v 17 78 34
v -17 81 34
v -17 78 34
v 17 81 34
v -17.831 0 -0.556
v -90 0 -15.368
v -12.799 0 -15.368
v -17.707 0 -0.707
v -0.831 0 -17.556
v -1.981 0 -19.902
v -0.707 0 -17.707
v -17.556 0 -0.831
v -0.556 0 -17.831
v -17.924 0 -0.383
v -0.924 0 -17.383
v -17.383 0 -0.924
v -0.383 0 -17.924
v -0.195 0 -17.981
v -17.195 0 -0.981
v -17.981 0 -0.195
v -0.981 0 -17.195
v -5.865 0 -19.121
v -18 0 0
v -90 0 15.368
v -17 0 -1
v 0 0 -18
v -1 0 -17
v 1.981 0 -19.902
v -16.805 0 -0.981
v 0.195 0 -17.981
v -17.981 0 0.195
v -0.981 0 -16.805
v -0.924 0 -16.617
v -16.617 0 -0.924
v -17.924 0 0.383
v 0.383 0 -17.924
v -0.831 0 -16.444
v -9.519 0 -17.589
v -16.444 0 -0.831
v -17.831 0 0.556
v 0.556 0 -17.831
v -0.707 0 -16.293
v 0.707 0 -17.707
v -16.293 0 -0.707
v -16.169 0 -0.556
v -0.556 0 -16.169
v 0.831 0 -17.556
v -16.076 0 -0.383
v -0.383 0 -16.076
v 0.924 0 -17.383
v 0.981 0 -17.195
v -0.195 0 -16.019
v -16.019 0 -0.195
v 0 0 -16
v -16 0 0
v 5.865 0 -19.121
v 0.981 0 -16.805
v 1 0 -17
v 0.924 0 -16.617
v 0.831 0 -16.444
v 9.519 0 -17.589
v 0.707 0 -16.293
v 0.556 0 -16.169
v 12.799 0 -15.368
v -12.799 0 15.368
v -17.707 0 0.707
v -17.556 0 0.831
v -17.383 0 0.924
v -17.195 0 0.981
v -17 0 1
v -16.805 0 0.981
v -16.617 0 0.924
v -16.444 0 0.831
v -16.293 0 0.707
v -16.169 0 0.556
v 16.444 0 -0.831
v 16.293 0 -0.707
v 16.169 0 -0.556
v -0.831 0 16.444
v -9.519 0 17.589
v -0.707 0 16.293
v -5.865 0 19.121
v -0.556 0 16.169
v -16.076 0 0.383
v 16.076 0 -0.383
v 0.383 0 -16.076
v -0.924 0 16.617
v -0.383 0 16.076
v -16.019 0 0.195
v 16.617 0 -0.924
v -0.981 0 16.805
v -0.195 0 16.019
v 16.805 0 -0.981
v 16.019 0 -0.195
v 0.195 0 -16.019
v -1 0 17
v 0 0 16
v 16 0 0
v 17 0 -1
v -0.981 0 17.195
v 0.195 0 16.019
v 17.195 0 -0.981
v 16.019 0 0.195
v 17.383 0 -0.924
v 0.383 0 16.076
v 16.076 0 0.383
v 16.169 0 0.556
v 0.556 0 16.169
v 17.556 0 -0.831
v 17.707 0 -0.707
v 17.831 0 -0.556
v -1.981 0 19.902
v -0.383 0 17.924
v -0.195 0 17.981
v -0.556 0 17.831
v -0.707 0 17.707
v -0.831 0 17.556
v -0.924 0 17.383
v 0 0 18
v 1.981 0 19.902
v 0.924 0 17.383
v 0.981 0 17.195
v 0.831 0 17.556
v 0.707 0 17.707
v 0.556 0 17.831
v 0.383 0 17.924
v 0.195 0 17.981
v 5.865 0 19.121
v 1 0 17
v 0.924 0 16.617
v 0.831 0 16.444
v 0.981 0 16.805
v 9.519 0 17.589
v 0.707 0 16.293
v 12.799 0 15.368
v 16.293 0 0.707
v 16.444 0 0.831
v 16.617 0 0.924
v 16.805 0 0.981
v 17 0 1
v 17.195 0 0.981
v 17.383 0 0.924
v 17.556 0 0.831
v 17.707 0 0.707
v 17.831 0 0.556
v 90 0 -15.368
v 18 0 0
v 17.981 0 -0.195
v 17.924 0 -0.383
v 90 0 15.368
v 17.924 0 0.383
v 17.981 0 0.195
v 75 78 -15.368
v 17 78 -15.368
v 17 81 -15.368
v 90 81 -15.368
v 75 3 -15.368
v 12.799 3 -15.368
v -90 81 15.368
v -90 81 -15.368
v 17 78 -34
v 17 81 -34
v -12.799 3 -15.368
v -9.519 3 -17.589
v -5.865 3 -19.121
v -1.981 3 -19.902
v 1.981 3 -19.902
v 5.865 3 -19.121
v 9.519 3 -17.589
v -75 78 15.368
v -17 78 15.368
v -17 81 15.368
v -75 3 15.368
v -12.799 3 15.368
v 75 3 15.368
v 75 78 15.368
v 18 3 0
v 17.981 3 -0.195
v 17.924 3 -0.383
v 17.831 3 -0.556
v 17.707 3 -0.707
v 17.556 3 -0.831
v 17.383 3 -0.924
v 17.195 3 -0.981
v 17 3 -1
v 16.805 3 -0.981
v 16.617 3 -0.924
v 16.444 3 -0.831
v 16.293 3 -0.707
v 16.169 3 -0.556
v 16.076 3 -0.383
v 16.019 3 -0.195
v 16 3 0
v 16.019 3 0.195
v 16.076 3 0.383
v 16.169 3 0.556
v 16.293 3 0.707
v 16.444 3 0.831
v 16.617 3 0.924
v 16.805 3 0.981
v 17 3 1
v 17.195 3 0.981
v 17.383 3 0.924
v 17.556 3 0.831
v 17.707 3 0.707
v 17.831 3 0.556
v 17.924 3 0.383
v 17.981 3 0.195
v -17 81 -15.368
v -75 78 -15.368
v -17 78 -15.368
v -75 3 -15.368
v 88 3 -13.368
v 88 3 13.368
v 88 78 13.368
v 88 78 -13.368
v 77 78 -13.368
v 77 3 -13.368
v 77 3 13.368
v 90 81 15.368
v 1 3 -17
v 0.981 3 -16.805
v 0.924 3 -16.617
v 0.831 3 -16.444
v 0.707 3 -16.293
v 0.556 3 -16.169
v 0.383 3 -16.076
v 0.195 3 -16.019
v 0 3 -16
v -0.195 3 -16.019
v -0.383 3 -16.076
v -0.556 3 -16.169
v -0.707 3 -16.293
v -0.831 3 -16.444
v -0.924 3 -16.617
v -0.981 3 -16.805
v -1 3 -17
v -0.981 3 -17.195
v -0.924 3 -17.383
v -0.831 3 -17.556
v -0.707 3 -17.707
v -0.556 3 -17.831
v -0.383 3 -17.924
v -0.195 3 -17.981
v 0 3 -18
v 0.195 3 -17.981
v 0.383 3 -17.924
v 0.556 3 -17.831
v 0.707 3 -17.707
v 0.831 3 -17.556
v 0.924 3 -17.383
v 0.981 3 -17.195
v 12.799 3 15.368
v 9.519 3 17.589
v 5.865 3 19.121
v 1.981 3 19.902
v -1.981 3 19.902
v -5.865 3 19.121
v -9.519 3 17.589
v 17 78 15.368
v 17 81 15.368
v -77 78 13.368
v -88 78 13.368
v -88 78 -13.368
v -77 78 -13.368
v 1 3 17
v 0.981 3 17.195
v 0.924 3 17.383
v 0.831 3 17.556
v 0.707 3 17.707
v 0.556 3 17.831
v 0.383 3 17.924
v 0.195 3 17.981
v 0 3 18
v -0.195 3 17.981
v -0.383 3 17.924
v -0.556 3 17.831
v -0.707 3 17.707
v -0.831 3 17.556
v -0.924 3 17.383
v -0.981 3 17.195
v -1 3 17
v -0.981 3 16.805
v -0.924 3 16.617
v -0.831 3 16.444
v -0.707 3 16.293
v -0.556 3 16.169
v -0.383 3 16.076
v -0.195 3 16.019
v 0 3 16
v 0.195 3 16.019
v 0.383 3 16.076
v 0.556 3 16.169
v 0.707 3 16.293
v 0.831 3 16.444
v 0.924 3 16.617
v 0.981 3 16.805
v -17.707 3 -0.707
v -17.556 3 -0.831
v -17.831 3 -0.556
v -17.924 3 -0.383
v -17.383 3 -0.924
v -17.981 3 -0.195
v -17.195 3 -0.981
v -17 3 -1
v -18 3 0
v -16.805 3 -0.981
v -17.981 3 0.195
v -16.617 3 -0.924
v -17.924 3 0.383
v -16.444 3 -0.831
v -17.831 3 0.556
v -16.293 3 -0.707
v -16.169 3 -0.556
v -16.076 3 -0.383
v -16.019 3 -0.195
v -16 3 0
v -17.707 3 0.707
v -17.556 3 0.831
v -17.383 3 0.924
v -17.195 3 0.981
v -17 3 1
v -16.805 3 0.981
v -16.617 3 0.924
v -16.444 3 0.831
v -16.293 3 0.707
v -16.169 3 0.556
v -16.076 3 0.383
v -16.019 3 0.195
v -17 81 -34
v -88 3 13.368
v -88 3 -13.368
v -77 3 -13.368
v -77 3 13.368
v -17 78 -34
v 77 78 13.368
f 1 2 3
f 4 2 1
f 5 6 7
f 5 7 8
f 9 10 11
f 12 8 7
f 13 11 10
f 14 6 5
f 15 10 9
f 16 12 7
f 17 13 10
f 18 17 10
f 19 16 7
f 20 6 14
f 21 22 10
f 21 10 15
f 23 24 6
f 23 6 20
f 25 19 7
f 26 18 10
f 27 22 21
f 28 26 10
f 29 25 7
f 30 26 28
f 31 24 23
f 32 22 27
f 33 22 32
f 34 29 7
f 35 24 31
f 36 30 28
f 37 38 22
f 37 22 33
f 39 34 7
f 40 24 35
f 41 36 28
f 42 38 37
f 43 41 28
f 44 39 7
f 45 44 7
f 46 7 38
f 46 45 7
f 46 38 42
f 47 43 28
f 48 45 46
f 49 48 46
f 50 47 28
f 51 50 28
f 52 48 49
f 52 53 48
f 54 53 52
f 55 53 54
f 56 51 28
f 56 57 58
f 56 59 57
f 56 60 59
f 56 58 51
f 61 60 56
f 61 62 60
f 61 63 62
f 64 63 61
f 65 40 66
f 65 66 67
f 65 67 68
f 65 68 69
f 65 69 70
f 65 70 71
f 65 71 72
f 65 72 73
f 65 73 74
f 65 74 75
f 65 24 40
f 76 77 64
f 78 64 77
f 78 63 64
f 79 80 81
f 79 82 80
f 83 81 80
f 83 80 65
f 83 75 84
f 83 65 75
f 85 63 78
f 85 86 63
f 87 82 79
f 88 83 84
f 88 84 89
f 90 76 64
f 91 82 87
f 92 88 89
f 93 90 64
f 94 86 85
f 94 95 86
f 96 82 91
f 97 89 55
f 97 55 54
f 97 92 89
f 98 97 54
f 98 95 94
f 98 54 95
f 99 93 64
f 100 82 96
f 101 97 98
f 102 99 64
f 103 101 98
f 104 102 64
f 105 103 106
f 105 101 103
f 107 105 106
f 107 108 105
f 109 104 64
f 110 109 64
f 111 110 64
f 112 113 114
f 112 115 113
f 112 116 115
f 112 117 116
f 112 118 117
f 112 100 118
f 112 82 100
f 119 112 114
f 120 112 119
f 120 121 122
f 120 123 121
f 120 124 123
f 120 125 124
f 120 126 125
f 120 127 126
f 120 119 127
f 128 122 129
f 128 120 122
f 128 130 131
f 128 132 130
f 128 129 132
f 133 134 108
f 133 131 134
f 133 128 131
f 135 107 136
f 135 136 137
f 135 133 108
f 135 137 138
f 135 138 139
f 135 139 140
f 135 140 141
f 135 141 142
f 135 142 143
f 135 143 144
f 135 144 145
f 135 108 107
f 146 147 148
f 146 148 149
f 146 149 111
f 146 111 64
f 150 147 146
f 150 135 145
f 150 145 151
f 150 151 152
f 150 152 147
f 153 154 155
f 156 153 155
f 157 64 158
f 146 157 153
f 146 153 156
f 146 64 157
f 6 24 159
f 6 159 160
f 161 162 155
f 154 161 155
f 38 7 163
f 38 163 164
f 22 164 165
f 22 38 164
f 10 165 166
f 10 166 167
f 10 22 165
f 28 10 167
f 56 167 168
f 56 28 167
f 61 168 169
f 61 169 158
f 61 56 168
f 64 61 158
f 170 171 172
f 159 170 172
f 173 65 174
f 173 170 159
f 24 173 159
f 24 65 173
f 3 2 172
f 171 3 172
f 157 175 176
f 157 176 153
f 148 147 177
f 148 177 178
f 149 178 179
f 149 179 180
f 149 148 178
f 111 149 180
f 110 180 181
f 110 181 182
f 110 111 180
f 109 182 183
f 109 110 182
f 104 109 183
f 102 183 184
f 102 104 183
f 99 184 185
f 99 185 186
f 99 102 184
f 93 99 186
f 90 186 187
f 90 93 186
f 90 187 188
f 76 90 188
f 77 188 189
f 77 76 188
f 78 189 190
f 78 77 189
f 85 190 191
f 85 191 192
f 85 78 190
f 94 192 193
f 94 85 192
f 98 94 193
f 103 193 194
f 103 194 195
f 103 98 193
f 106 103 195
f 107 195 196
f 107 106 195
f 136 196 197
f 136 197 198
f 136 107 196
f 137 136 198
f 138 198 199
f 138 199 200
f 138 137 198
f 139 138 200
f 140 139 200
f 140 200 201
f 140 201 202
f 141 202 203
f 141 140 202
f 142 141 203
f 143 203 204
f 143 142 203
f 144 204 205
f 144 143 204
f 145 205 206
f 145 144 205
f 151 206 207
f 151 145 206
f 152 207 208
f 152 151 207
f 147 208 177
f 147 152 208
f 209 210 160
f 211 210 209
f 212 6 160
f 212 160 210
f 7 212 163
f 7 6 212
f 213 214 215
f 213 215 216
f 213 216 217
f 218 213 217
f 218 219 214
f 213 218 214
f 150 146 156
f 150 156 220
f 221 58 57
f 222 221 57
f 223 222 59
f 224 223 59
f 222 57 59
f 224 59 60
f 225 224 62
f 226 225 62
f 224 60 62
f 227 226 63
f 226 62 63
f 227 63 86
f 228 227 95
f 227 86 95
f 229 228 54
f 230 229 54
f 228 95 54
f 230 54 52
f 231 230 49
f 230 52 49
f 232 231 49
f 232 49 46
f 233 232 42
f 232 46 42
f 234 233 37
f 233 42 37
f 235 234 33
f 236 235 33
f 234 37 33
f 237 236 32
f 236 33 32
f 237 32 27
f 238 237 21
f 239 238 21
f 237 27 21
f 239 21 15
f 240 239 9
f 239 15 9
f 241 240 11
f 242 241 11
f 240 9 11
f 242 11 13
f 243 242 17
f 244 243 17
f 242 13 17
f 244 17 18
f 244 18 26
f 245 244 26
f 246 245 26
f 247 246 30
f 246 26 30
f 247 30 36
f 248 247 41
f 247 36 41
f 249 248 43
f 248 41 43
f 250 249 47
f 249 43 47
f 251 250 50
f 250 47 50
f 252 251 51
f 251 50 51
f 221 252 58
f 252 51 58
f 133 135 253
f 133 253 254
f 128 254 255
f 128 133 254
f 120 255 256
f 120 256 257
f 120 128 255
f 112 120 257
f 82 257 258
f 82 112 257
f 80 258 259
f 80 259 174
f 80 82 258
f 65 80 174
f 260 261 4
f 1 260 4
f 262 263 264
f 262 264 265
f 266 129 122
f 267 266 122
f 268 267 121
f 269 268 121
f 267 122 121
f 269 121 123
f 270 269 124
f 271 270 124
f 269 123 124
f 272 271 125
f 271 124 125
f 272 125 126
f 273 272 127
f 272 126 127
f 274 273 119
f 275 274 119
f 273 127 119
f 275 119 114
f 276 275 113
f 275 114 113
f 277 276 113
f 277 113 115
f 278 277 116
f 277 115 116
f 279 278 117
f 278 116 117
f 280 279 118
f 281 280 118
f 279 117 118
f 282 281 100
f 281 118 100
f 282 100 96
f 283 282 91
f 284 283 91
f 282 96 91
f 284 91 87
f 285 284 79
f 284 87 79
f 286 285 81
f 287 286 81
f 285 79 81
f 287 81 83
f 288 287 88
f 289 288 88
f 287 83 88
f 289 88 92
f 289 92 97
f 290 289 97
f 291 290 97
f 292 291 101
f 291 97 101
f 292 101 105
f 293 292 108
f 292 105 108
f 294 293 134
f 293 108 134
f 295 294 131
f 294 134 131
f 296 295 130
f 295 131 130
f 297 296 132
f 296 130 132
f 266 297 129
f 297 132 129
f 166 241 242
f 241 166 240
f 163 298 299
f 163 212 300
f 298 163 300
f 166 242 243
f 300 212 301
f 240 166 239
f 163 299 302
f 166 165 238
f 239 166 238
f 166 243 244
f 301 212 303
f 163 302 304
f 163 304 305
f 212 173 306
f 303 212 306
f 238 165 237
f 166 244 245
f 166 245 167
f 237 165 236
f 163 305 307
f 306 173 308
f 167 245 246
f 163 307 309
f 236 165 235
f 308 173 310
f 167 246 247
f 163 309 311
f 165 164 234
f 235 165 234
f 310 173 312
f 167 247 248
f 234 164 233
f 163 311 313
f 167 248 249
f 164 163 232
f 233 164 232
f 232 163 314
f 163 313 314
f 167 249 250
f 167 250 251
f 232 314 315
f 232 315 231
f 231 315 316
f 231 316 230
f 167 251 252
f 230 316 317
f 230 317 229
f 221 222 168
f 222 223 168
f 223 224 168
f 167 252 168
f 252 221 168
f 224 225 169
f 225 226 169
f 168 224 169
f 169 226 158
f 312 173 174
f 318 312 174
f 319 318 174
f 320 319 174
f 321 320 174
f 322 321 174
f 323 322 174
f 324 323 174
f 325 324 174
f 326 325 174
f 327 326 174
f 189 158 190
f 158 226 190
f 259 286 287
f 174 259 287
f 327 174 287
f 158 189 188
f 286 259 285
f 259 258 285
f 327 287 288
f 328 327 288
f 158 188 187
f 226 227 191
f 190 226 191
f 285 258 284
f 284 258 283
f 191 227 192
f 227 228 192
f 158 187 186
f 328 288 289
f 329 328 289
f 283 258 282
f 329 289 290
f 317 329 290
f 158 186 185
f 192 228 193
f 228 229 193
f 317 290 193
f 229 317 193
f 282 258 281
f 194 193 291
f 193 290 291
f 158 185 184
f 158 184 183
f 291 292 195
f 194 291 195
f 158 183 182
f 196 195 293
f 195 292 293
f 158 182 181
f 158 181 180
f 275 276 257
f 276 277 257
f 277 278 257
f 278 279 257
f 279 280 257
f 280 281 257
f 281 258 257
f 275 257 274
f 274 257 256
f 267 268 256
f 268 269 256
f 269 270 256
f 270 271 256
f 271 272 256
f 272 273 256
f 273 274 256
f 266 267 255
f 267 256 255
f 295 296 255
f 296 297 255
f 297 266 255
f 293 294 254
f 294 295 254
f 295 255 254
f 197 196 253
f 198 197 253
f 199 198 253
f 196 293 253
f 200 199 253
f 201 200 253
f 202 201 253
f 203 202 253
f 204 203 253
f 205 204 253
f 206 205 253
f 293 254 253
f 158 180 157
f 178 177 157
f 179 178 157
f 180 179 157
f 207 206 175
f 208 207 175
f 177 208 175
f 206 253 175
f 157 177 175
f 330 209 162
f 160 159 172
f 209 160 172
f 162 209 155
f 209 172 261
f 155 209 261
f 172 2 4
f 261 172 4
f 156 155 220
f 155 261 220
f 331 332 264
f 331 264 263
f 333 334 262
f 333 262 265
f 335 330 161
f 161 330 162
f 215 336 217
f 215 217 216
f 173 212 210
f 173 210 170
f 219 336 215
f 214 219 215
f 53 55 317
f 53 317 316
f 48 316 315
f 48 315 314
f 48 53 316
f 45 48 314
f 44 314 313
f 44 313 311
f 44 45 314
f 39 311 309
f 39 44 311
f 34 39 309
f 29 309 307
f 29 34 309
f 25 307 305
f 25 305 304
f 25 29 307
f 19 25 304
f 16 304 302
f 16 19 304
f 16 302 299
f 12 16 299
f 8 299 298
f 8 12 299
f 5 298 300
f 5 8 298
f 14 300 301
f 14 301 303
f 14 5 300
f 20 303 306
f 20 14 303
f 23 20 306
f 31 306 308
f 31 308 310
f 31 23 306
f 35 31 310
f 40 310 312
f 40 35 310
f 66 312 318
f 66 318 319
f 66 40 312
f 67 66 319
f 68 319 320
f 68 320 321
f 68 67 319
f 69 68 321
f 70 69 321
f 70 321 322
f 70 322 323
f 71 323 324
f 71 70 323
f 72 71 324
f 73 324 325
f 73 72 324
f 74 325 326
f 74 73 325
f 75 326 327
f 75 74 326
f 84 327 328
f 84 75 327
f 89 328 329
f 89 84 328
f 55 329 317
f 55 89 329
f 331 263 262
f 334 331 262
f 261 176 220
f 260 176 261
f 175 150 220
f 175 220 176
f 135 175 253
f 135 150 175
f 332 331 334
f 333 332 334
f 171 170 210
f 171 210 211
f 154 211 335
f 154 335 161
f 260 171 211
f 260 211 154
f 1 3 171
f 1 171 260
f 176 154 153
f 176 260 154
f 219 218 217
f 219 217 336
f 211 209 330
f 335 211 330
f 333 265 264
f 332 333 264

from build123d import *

# Parameters (mm, degrees)
F0_R     = 1
F1_DEPTH = 3
F2_DEPTH = 81
F4_W     = 73
F4_H     = 15.3680173474
F4_W_2   = 34
F4_H_2   = 18.6319826526
F5_DEPTH = 3
F6_DEPTH = 3


with BuildPart() as f1:
    # F0 (on Front) → F1 (new body)
    with BuildSketch(Plane.XZ):
        with BuildLine():
            Line((-75, -15.3680173474), (-12.7993766571, -15.3680173474))
            ThreePointArc((-12.7993766571, -15.3680173474), (-18.1105981837, -8.4856486746), (-20, 0))
            Line((-20, 0), (-69, 0))
            Line((-69, 0), (-75, 0))
            Line((-75, 0), (-75, -15.3680173474))
        make_face()
        with BuildLine():
            ThreePointArc((-20, 0), (-18.1105981837, 8.4856486746), (-12.7993766571, 15.3680173474))
            Line((-12.7993766571, 15.3680173474), (-75, 15.3680173474))
            Line((-75, 15.3680173474), (-75, 0))
            Line((-75, 0), (-69, 0))
            Line((-69, 0), (-20, 0))
        make_face()
        with BuildLine():
            ThreePointArc((12.7993766571, 15.3680173474), (18.1105981837, 8.4856486746), (20, 0))
            Line((20, 0), (69, 0))
            Line((69, 0), (75, 0))
            Line((75, 0), (75, 15.3680173474))
            Line((75, 15.3680173474), (12.7993766571, 15.3680173474))
        make_face()
        with BuildLine():
            Line((69, 0), (20, 0))
            ThreePointArc((20, 0), (18.1105981837, -8.4856486746), (12.7993766571, -15.3680173474))
            Line((12.7993766571, -15.3680173474), (75, -15.3680173474))
            Line((75, -15.3680173474), (75, 0))
            Line((75, 0), (69, 0))
        make_face()
        with BuildLine():
            Line((18, 0), (20, 0))
            ThreePointArc((20, 0), (18.1105981837, 8.4856486746), (12.7993766571, 15.3680173474))
            ThreePointArc((12.7993766571, 15.3680173474), (0, 20), (-12.7993766571, 15.3680173474))
            ThreePointArc((-12.7993766571, 15.3680173474), (-18.1105981837, 8.4856486746), (-20, 0))
            Line((-20, 0), (-18, 0))
            ThreePointArc((-18, 0), (-17, 1), (-16, 0))
            Line((-16, 0), (0, 0))
            Line((0, 0), (16, 0))
            ThreePointArc((16, 0), (17, 1), (18, 0))
        make_face()
        with Locations((0, 17)):
            Circle(F0_R, mode=Mode.SUBTRACT)
        with BuildLine():
            ThreePointArc((12.7993766571, -15.3680173474), (18.1105981837, -8.4856486746), (20, 0))
            Line((20, 0), (18, 0))
            ThreePointArc((18, 0), (17, -1), (16, 0))
            Line((16, 0), (0, 0))
            Line((0, 0), (-16, 0))
            ThreePointArc((-16, 0), (-17, -1), (-18, 0))
            Line((-18, 0), (-20, 0))
            ThreePointArc((-20, 0), (-18.1105981837, -8.4856486746), (-12.7993766571, -15.3680173474))
            ThreePointArc((-12.7993766571, -15.3680173474), (0, -20), (12.7993766571, -15.3680173474))
        make_face()
        with Locations((0, -17)):
            Circle(F0_R, mode=Mode.SUBTRACT)
    extrude(amount=-F1_DEPTH)

    # F0 (on Front) → F2 (join)
    with BuildSketch(Plane.XZ):
        Polygon((90, 15.3680173474), (75, 15.3680173474), (75, 0), (75, -15.3680173474), (90, -15.3680173474), align=None)
        Polygon((77, 0), (77, 13.3680173474), (88, 13.3680173474), (88, -13.3680173474), (77, -13.3680173474), align=None, mode=Mode.SUBTRACT)
        Polygon((-75, 0), (-75, 15.3680173474), (-90, 15.3680173474), (-90, -15.3680173474), (-75, -15.3680173474), align=None)
        Polygon((-88, -13.3680173474), (-88, 13.3680173474), (-77, 13.3680173474), (-77, 0), (-77, -13.3680173474), align=None, mode=Mode.SUBTRACT)
    extrude(amount=-F2_DEPTH)

    # F4 (on offset) → F5 (join)
    with BuildSketch(Plane.XZ.offset(-81)):
        with Locations((53.5, 7.6840086737)):
            Rectangle(F4_W, F4_H)
        with Locations((53.5, -7.6840086737)):
            Rectangle(F4_W, F4_H)
        Polygon((-17, 0), (0, 0), (17, 0), (17, 15.3680173474), (-17, 15.3680173474), align=None)
        with Locations((0, 24.6840086737)):
            Rectangle(F4_W_2, F4_H_2)
        Polygon((17, 0), (0, 0), (-17, 0), (-17, -15.3680173474), (17, -15.3680173474), align=None)
        with Locations((0, -24.6840086737)):
            Rectangle(F4_W_2, F4_H_2)
        with Locations((-53.5, -7.6840086737)):
            Rectangle(F4_W, F4_H)
        with Locations((-53.5, 7.6840086737)):
            Rectangle(F4_W, F4_H)
    extrude(amount=F5_DEPTH)

    # F0 (on Front) → F6 (join)
    with BuildSketch(Plane.XZ):
        Polygon((88, 13.3680173474), (77, 13.3680173474), (77, 0), (77, -13.3680173474), (88, -13.3680173474), align=None)
        Polygon((-77, 13.3680173474), (-88, 13.3680173474), (-88, -13.3680173474), (-77, -13.3680173474), (-77, 0), align=None)
    extrude(amount=-F6_DEPTH)


solid = f1.part
